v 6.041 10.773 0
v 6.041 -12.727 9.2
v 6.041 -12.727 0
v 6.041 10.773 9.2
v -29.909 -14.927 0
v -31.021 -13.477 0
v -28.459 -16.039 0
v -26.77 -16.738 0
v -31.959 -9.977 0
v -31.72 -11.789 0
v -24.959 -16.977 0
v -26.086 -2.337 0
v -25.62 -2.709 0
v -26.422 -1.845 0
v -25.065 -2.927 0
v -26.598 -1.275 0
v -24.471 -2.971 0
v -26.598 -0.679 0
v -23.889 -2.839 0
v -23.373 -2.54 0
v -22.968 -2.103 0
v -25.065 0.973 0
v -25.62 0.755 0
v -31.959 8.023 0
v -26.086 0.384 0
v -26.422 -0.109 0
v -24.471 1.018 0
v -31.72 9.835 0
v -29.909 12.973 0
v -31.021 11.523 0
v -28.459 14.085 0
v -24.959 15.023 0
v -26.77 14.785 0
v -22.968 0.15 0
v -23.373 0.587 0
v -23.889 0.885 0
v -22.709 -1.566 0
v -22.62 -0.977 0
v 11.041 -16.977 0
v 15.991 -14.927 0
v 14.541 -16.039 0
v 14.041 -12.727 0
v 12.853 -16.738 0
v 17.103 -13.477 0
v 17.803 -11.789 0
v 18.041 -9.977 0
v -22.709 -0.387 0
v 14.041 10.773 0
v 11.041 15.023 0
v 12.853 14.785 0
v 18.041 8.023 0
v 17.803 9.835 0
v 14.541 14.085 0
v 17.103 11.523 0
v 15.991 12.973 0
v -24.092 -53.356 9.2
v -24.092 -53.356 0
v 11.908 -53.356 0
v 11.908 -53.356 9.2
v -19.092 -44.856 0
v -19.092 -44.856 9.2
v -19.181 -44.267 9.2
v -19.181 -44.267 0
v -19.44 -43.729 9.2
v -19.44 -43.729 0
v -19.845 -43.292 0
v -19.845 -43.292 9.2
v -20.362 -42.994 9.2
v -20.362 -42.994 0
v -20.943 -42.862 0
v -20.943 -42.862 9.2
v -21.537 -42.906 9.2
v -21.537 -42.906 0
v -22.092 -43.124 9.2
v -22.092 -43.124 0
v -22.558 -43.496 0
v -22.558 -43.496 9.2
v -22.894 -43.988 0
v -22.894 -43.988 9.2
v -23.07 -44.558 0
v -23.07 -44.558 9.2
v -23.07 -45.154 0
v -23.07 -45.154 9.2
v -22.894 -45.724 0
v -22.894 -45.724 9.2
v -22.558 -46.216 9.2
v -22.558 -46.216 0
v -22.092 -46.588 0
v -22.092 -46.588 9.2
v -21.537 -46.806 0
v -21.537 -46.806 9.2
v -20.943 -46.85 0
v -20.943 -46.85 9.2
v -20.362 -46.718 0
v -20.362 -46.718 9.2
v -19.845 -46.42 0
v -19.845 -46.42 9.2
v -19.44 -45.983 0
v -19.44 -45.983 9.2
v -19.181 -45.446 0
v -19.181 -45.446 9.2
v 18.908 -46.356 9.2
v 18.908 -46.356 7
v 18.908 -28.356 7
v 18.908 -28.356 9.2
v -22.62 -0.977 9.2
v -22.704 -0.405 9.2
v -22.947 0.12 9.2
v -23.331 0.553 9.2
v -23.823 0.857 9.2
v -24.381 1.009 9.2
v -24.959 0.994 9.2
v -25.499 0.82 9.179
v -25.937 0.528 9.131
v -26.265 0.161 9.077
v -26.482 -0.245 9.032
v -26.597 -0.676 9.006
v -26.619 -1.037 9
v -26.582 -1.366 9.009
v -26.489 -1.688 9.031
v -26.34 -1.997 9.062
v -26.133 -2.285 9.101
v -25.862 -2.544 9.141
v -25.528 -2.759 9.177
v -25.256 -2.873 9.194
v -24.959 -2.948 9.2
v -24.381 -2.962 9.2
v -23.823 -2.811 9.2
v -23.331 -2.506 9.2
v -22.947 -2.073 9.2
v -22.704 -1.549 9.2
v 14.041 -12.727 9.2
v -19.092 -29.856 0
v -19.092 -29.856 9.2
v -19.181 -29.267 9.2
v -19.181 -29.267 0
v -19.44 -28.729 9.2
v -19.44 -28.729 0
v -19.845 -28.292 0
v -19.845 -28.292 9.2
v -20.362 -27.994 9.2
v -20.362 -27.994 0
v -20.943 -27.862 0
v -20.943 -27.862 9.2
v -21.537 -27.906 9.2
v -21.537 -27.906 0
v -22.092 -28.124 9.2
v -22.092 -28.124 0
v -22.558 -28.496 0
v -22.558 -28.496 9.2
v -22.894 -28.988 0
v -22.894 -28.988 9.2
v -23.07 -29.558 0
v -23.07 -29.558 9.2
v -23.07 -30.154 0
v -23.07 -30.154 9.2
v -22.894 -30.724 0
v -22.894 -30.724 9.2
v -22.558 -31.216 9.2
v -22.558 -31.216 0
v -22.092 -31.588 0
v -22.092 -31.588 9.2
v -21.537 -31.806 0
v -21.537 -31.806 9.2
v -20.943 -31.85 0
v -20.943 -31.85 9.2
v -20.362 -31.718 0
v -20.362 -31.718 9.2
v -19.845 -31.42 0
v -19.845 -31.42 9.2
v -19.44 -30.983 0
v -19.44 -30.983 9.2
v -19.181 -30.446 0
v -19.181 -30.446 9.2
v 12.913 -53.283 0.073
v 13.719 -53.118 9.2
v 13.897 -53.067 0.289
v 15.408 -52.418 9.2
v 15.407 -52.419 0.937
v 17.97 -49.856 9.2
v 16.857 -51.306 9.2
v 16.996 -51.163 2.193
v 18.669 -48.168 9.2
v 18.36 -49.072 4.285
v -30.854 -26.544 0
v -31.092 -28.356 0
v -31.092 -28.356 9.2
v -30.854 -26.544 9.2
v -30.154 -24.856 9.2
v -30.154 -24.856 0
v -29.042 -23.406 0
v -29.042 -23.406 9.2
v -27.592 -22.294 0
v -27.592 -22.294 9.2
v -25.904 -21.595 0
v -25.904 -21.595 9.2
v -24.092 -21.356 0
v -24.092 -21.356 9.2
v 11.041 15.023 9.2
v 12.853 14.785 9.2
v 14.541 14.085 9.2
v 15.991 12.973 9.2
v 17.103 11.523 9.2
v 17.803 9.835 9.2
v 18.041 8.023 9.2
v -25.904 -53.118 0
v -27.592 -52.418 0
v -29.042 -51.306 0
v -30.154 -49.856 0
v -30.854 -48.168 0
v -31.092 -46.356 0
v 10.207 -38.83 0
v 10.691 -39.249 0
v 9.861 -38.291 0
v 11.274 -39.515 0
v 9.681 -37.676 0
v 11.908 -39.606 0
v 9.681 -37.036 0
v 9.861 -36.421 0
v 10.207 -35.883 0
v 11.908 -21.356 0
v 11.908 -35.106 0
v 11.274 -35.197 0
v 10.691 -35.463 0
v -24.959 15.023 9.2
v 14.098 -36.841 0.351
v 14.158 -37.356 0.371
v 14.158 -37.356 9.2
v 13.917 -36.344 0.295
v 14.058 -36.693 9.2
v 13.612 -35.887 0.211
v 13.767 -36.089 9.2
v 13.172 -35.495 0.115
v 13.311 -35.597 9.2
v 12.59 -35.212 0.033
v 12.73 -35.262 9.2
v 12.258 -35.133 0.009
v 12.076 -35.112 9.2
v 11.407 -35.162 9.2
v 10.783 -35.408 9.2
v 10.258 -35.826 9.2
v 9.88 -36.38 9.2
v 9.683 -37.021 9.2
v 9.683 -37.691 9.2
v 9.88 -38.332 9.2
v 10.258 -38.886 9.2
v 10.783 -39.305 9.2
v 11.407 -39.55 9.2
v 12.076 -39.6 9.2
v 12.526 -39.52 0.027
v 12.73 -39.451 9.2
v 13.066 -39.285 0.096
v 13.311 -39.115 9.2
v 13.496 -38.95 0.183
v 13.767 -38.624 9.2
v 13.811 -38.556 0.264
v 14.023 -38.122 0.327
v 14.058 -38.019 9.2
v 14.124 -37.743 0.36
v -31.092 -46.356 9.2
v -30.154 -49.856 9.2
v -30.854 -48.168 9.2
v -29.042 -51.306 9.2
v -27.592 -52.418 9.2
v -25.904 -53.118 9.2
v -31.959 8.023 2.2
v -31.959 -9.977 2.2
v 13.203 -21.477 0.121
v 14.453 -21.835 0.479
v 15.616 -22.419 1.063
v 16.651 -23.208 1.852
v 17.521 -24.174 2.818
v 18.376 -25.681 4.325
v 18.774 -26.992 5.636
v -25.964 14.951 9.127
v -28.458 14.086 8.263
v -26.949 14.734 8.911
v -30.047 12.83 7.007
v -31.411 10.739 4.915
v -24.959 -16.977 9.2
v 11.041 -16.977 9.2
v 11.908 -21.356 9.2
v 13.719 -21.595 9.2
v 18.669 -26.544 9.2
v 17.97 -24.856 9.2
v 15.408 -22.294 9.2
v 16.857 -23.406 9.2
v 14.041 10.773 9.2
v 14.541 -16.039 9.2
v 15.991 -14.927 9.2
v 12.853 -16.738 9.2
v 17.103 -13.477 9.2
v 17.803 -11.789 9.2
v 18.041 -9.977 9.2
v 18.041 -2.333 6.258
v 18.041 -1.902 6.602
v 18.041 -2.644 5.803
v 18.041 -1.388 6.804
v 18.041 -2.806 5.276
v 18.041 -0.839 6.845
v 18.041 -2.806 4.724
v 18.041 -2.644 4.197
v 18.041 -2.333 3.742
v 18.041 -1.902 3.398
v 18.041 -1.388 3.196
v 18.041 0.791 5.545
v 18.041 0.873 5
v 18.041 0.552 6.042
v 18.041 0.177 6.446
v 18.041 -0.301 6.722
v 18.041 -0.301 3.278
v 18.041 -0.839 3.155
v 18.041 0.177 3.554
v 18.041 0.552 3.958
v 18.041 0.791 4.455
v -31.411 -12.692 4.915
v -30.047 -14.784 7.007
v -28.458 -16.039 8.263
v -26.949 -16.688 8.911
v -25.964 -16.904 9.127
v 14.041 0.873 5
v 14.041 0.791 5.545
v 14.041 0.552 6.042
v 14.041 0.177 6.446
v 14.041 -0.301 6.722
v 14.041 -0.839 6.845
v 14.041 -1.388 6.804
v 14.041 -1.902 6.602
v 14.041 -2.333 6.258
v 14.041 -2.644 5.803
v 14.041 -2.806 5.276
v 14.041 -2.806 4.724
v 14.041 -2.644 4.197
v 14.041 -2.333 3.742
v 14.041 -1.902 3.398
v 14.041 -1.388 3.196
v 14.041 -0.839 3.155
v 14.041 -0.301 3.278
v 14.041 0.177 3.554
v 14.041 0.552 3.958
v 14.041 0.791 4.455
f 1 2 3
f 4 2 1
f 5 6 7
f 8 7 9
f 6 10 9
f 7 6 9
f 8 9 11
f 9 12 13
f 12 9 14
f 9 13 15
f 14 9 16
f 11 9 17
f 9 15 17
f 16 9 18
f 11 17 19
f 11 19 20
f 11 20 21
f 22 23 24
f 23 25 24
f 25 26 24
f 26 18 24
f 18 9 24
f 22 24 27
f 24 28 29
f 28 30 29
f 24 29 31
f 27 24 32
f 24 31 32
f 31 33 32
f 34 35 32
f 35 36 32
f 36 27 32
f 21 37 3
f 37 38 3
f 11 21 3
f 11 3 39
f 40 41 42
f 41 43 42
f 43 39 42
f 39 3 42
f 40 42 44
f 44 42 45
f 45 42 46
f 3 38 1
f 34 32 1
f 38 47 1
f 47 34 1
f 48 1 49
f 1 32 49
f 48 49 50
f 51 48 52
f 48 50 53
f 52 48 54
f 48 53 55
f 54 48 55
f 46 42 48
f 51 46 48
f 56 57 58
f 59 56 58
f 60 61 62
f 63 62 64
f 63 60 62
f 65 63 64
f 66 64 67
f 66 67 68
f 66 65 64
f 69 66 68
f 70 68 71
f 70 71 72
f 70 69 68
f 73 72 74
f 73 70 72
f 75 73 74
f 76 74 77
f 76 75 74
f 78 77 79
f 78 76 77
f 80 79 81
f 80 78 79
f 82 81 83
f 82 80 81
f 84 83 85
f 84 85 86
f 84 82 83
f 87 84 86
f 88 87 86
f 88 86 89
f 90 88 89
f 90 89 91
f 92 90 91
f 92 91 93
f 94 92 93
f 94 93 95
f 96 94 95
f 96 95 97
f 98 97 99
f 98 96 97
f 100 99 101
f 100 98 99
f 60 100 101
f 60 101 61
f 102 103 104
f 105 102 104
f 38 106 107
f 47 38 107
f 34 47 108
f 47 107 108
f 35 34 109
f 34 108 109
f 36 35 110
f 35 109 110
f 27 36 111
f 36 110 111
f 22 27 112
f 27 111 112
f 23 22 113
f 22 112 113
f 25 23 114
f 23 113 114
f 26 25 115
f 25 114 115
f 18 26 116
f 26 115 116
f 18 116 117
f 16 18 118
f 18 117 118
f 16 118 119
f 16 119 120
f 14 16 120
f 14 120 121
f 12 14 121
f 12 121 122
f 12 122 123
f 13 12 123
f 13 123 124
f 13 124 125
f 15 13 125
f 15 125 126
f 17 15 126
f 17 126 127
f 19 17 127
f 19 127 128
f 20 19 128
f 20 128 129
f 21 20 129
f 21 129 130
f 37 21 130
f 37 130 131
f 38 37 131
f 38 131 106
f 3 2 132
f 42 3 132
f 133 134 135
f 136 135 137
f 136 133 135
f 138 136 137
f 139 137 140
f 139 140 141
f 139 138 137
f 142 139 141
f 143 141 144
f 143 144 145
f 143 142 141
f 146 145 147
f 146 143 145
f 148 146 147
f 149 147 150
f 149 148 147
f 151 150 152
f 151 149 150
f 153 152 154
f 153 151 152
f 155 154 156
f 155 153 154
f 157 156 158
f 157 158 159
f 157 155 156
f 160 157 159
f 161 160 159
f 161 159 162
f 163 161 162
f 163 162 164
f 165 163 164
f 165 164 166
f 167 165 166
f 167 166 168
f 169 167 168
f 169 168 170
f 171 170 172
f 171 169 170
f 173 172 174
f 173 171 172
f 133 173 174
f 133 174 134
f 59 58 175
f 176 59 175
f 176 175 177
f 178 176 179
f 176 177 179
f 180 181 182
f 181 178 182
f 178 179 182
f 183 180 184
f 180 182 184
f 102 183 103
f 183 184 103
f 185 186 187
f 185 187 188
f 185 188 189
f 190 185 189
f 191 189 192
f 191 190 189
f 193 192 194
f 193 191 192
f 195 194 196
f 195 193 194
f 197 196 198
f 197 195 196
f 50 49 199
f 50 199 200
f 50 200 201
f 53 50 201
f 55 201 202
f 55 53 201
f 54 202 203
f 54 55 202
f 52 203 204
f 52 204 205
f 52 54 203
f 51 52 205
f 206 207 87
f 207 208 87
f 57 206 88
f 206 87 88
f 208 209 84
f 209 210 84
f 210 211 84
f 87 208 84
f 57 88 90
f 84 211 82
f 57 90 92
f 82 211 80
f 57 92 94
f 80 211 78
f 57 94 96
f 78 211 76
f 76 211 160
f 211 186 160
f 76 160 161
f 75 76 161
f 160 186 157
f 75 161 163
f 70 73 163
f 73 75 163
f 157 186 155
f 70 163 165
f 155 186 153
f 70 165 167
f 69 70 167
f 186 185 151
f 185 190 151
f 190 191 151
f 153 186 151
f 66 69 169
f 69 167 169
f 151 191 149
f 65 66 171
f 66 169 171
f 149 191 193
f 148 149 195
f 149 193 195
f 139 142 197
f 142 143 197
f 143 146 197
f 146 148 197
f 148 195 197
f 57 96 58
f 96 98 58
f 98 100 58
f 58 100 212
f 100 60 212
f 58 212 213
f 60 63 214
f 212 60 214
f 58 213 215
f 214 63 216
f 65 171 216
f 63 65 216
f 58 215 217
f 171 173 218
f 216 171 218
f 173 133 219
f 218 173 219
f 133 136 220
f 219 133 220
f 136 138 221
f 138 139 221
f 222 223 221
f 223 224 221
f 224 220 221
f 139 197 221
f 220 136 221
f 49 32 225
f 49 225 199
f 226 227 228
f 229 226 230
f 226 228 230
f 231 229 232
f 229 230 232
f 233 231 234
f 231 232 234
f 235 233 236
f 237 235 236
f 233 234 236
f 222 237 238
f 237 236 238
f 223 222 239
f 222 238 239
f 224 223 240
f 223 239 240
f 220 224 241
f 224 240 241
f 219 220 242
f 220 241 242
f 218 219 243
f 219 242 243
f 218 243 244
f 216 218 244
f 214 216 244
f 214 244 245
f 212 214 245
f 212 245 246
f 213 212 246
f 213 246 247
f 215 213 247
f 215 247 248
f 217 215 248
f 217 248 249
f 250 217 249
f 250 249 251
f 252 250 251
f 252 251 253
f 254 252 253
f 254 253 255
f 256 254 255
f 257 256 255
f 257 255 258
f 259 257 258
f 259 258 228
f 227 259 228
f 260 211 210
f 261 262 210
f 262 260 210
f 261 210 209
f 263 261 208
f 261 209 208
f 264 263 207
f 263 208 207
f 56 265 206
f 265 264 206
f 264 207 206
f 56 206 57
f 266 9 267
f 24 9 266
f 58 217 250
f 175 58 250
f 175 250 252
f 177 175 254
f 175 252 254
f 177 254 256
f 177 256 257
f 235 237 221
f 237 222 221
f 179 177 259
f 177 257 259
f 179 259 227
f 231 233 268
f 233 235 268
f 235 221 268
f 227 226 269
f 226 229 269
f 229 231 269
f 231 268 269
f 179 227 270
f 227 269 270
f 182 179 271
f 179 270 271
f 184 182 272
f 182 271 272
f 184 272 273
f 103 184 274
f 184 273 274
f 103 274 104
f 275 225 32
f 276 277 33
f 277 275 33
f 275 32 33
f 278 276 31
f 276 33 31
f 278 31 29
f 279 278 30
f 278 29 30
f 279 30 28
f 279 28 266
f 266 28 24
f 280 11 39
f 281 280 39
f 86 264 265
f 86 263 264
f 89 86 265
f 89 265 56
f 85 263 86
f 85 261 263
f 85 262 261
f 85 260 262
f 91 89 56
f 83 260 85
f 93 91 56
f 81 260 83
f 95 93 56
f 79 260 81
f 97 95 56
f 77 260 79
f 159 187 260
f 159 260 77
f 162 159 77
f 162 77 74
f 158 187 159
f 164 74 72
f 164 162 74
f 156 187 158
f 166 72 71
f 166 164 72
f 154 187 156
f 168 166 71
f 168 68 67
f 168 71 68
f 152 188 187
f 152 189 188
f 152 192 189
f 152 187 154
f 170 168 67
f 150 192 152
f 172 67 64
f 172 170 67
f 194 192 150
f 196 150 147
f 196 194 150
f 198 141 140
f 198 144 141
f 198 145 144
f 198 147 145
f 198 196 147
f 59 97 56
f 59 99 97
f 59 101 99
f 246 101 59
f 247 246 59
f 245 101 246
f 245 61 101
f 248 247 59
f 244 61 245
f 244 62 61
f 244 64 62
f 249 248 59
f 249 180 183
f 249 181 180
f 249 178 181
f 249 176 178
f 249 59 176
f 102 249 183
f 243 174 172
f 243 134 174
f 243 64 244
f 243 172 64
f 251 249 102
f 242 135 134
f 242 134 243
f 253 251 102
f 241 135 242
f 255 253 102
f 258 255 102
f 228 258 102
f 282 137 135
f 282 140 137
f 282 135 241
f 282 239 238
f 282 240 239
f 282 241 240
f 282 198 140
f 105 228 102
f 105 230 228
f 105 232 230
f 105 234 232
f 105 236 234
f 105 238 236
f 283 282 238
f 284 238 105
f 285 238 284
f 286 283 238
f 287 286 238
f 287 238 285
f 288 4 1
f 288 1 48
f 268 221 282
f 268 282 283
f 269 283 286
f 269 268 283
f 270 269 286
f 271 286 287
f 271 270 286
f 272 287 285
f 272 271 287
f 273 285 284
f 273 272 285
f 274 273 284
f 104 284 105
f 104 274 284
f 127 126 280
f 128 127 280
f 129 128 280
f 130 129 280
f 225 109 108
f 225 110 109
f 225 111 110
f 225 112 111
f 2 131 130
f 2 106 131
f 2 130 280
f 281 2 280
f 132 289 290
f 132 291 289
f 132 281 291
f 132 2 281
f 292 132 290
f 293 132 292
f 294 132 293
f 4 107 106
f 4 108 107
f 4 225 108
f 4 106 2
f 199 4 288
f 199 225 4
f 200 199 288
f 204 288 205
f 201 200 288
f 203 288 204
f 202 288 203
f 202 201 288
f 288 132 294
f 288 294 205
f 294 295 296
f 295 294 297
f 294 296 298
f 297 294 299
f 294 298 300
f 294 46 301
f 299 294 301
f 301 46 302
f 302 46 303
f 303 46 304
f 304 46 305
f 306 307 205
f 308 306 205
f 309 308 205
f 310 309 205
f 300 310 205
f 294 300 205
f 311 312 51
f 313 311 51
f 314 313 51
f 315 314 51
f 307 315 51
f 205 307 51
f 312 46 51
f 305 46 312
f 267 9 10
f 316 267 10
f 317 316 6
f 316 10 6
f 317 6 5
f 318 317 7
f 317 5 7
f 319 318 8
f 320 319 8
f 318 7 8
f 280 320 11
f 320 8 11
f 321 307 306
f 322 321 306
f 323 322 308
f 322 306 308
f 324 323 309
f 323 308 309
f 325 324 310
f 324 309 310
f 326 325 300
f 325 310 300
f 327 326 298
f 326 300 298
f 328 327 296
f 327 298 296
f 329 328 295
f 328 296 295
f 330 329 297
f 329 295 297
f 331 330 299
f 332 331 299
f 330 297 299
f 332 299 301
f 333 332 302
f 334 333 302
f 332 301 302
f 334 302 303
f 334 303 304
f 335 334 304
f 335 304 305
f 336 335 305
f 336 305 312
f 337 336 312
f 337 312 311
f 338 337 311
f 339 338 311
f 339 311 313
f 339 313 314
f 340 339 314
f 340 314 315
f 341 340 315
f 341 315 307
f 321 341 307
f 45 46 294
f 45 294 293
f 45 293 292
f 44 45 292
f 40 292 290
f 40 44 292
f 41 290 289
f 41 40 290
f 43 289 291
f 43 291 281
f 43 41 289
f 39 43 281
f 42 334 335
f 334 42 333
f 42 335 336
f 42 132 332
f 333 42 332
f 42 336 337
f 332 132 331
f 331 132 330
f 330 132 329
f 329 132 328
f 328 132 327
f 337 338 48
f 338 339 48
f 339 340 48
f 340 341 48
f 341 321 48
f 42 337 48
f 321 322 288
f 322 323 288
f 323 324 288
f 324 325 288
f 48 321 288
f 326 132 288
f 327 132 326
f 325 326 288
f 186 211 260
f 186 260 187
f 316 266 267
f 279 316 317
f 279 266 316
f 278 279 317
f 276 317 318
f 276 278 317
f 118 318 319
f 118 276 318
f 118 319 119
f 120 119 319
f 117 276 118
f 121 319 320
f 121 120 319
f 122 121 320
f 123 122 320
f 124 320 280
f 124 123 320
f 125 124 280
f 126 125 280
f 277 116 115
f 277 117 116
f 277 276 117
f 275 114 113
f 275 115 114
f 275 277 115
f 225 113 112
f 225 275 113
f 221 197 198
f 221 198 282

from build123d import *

# Parameters (mm, degrees)
F0_W          = 50
F0_H          = 32
F1_DEPTH      = 9.2
F0_R          = 2
F2_W          = 8
F2_H          = 23.5
F2_R          = 2
F3_DEPTH      = 25
F4_R          = 1.85
F5_DEPTH      = 5
F6_R          = 2.25
F7_DEPTH      = 25
F8_T1_DEPTH   = 44.2
F8_T3_DEPTH   = 67
F8_2_T1_DEPTH = 67
F8_2_T3_DEPTH = 44.2


# Not quite as in the source:
# - a fillet or chamfer that OpenCascade refuses, or shapes differently, is made with other operations: its cross-section is extruded or revolved along the edge and cut away or added
# - a feature names something its author has since deleted; it is built from what else it names


with BuildPart() as f1:
    # F0 (on Top) → F1 (new body)
    with BuildSketch(Plane.XY):
        with Locations((-6.9587575272, -0.9767782996)):
            Rectangle(F0_W, F0_H)
    extrude(amount=F1_DEPTH)

    # F2 (on face) → F3 (cut)
    with BuildSketch(Plane.XY.offset(9.2)):
        with Locations((10.0412424728, -0.9767782996)):
            Rectangle(F2_W, F2_H)
        with Locations((-24.6200456972, -0.9767782996)):
            Circle(F2_R)
    extrude(amount=-F3_DEPTH, mode=Mode.SUBTRACT)

    # F4 (on face) → F5 (cut)
    with BuildSketch(Plane.YZ.offset(18.0412424728)):
        with Locations((-0.9767782996, 5)):
            Circle(F4_R)
    extrude(amount=-F5_DEPTH, mode=Mode.SUBTRACT)

    # F8#2: fillet of radius 7 on 5 edges, made by hand

    # F8_2_s2 → F8_2_t1 (cut)
    with BuildSketch(Plane.XZ.offset(-32.5232217004)):
        with BuildLine():
            ThreePointArc((-31.9587575272, 2.2), (-29.9085049955, 7.1497474683), (-24.9587575272, 9.2))
            Line((-24.9587575272, 9.2), (-31.9587575272, 9.2))
            Line((-31.9587575272, 9.2), (-31.9587575272, 2.2))
        make_face()
    extrude(amount=F8_2_T1_DEPTH, mode=Mode.SUBTRACT)

    # F8_2_s4 → F8_2_t3 (cut)
    with BuildSketch(Plane.XY.offset(-17.5)):
        with BuildLine():
            ThreePointArc((-31.9587575272, -9.9767782996), (-29.9085049955, -14.9265257679), (-24.9587575272, -16.9767782996))
            Line((-24.9587575272, -16.9767782996), (-31.9587575272, -16.9767782996))
            Line((-31.9587575272, -16.9767782996), (-31.9587575272, -9.9767782996))
        make_face()
        with BuildLine():
            ThreePointArc((-24.9587575272, 15.0232217004), (-29.9085049955, 12.9729691687), (-31.9587575272, 8.0232217004))
            Line((-31.9587575272, 8.0232217004), (-31.9587575272, 15.0232217004))
            Line((-31.9587575272, 15.0232217004), (-24.9587575272, 15.0232217004))
        make_face()
        with BuildLine():
            ThreePointArc((18.0412424728, -9.9767782996), (15.9909899411, -14.9265257679), (11.0412424728, -16.9767782996))
            Line((11.0412424728, -16.9767782996), (18.0412424728, -16.9767782996))
            Line((18.0412424728, -16.9767782996), (18.0412424728, -9.9767782996))
        make_face()
        with BuildLine():
            ThreePointArc((11.0412424728, 15.0232217004), (15.9909899411, 12.9729691687), (18.0412424728, 8.0232217004))
            Line((18.0412424728, 8.0232217004), (18.0412424728, 15.0232217004))
            Line((18.0412424728, 15.0232217004), (11.0412424728, 15.0232217004))
        make_face()
    extrude(amount=F8_2_T3_DEPTH, mode=Mode.SUBTRACT)


with BuildPart() as f1b:
    # F0 (on Top) → F1, piece 2 (new body)
    with BuildSketch(Plane.XY):
        with Locations((-6.0923215002, -37.3560663462)):
            Rectangle(F0_W, F0_H)
        with Locations((-21.0923215002, -44.8560663462)):
            Circle(F0_R, mode=Mode.SUBTRACT)
        with Locations((-21.0923215002, -29.8560663462)):
            Circle(F0_R, mode=Mode.SUBTRACT)
    extrude(amount=F1_DEPTH)

    # F6 (on face) → F7 (cut)
    with BuildSketch(Plane.XY.offset(9.2)):
        with Locations((11.9076784998, -37.3560663462)):
            Circle(F6_R)
    extrude(amount=-F7_DEPTH, mode=Mode.SUBTRACT)

    # F8: fillet of radius 7 on 5 edges, made by hand

    # F8_s2 → F8_t1 (cut)
    with BuildSketch(Plane.XY.offset(-17.5)):
        with BuildLine():
            ThreePointArc((11.9076784998, -21.3560663462), (16.8574259681, -23.4063188779), (18.9076784998, -28.3560663462))
            Line((18.9076784998, -28.3560663462), (18.9076784998, -21.3560663462))
            Line((18.9076784998, -21.3560663462), (11.9076784998, -21.3560663462))
        make_face()
        with BuildLine():
            ThreePointArc((11.9076784998, -53.3560663462), (16.8574259681, -51.3058138145), (18.9076784998, -46.3560663462))
            Line((18.9076784998, -46.3560663462), (18.9076784998, -53.3560663462))
            Line((18.9076784998, -53.3560663462), (11.9076784998, -53.3560663462))
        make_face()
        with BuildLine():
            ThreePointArc((-31.0923215002, -46.3560663462), (-29.0420689685, -51.3058138145), (-24.0923215002, -53.3560663462))
            Line((-24.0923215002, -53.3560663462), (-31.0923215002, -53.3560663462))
            Line((-31.0923215002, -53.3560663462), (-31.0923215002, -46.3560663462))
        make_face()
        with BuildLine():
            ThreePointArc((-31.0923215002, -28.3560663462), (-29.0420689685, -23.4063188779), (-24.0923215002, -21.3560663462))
            Line((-24.0923215002, -21.3560663462), (-31.0923215002, -21.3560663462))
            Line((-31.0923215002, -21.3560663462), (-31.0923215002, -28.3560663462))
        make_face()
    extrude(amount=F8_T1_DEPTH, mode=Mode.SUBTRACT)

    # F8_s4 → F8_t3 (cut)
    with BuildSketch(Plane.XZ.offset(3.8560663462)):
        with BuildLine():
            ThreePointArc((11.9076784998, 0), (16.8574259681, 2.0502525317), (18.9076784998, 7))
            Line((18.9076784998, 7), (18.9076784998, 0))
            Line((18.9076784998, 0), (11.9076784998, 0))
        make_face()
    extrude(amount=F8_T3_DEPTH, mode=Mode.SUBTRACT)


solid = Compound([f1.part, f1b.part])
